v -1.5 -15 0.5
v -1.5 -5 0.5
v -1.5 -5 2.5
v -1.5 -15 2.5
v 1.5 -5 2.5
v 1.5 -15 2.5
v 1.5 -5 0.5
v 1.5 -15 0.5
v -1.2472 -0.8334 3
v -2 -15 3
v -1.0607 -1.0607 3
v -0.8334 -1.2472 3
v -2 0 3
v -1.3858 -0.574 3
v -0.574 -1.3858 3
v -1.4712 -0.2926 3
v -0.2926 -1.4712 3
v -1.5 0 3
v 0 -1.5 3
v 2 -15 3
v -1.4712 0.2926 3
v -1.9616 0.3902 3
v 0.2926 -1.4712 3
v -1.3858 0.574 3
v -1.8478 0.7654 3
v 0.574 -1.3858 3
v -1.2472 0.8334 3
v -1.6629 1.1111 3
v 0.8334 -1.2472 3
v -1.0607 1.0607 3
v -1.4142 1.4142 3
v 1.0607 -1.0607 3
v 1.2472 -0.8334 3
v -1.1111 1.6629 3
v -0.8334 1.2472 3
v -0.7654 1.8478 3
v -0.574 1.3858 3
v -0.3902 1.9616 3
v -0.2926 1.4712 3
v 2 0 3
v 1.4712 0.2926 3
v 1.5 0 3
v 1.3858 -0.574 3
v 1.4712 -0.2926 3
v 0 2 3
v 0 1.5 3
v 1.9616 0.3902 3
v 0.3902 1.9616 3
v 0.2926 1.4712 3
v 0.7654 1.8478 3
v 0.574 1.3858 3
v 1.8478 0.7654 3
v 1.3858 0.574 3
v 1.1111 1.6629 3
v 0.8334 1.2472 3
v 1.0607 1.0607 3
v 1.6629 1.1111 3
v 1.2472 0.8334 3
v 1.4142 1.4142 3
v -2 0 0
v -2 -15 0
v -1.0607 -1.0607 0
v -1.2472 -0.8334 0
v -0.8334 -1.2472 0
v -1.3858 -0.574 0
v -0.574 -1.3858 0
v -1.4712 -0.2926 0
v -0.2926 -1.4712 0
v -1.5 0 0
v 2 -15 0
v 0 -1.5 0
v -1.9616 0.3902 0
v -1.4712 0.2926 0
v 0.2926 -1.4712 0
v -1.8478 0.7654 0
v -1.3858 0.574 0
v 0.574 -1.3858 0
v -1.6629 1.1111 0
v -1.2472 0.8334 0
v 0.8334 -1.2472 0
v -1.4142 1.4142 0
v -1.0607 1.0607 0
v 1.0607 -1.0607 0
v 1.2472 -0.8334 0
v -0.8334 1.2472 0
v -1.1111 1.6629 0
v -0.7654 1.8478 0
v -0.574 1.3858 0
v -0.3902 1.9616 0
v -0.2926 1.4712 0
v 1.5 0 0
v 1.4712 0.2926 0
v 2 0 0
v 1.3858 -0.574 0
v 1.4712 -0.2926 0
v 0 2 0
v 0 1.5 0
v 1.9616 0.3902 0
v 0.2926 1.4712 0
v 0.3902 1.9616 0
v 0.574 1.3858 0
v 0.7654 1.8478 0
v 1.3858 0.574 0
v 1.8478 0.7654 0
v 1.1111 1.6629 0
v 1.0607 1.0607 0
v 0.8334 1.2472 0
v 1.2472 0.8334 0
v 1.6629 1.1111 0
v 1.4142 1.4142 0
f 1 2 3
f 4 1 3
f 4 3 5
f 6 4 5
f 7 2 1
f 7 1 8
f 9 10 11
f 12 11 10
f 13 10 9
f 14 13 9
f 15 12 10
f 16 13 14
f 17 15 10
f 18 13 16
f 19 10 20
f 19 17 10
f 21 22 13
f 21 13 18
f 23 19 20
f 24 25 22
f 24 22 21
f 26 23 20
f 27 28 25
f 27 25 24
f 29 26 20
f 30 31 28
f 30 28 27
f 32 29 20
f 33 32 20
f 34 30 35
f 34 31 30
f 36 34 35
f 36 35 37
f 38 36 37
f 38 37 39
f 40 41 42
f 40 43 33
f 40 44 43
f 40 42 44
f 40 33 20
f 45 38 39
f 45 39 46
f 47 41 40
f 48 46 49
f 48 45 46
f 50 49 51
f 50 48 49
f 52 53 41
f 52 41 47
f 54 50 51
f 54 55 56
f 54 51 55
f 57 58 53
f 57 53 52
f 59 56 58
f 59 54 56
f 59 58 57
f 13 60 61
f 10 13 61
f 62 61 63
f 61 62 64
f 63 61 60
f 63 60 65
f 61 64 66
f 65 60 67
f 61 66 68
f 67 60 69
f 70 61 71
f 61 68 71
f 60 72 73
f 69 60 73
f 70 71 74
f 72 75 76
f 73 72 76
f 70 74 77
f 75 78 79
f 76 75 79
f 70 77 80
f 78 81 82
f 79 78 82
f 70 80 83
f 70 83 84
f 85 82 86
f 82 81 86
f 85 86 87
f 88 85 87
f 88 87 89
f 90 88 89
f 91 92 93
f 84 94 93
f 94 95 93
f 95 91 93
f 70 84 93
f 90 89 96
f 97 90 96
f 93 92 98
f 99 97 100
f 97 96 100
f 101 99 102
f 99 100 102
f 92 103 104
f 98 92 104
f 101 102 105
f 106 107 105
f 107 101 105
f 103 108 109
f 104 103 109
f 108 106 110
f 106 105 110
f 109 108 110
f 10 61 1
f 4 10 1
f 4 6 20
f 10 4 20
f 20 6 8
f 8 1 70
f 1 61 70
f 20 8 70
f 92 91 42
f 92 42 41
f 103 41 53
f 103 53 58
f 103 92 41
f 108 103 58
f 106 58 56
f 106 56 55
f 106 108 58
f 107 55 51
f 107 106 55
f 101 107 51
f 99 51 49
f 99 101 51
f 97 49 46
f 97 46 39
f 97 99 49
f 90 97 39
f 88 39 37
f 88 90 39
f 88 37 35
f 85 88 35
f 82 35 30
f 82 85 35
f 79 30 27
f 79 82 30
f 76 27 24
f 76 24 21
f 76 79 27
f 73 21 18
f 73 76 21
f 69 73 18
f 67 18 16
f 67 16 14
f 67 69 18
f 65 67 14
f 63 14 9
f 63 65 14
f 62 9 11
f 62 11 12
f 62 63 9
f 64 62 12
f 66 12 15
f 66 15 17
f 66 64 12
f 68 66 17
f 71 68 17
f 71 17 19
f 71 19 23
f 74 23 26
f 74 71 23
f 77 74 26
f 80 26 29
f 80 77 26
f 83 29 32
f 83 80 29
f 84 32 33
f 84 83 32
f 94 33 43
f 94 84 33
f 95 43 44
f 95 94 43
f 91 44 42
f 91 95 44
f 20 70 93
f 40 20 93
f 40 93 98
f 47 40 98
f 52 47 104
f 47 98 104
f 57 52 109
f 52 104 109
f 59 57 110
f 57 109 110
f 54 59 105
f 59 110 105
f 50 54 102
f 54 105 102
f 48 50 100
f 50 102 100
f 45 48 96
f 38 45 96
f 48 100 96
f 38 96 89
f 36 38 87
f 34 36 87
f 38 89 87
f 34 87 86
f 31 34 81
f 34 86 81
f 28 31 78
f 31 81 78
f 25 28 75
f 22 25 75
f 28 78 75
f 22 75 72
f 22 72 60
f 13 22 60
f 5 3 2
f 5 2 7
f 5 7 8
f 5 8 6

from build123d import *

# Parameters (mm, degrees)
SKETCH_1_R          = 2
SKETCH_1_R_2        = 1.5
EXTRUDE_1_DEPTH     = 3
SKETCH_2_W          = 3
SKETCH_2_H          = 2
CUT_EXTRUDE_1_DEPTH = 10


with BuildPart() as part:
    # 草图1 → 凸台-拉伸1 (new body)
    with BuildSketch(Plane.XY):
        with BuildLine():
            ThreePointArc((2, 0), (0, -2), (-2, 0))
            Line((-2, 0), (-2, -15))
            Line((-2, -15), (2, -15))
            Line((2, -15), (2, 0))
        make_face()
        Circle(SKETCH_1_R)
        Circle(SKETCH_1_R_2, mode=Mode.SUBTRACT)
    extrude(amount=EXTRUDE_1_DEPTH)

    # 草图2 → 切除-拉伸1 (cut)
    with BuildSketch(Plane.XZ.offset(15)):
        with Locations((0, 1.5)):
            Rectangle(SKETCH_2_W, SKETCH_2_H)
    extrude(amount=-CUT_EXTRUDE_1_DEPTH, mode=Mode.SUBTRACT)


solid = part.part
